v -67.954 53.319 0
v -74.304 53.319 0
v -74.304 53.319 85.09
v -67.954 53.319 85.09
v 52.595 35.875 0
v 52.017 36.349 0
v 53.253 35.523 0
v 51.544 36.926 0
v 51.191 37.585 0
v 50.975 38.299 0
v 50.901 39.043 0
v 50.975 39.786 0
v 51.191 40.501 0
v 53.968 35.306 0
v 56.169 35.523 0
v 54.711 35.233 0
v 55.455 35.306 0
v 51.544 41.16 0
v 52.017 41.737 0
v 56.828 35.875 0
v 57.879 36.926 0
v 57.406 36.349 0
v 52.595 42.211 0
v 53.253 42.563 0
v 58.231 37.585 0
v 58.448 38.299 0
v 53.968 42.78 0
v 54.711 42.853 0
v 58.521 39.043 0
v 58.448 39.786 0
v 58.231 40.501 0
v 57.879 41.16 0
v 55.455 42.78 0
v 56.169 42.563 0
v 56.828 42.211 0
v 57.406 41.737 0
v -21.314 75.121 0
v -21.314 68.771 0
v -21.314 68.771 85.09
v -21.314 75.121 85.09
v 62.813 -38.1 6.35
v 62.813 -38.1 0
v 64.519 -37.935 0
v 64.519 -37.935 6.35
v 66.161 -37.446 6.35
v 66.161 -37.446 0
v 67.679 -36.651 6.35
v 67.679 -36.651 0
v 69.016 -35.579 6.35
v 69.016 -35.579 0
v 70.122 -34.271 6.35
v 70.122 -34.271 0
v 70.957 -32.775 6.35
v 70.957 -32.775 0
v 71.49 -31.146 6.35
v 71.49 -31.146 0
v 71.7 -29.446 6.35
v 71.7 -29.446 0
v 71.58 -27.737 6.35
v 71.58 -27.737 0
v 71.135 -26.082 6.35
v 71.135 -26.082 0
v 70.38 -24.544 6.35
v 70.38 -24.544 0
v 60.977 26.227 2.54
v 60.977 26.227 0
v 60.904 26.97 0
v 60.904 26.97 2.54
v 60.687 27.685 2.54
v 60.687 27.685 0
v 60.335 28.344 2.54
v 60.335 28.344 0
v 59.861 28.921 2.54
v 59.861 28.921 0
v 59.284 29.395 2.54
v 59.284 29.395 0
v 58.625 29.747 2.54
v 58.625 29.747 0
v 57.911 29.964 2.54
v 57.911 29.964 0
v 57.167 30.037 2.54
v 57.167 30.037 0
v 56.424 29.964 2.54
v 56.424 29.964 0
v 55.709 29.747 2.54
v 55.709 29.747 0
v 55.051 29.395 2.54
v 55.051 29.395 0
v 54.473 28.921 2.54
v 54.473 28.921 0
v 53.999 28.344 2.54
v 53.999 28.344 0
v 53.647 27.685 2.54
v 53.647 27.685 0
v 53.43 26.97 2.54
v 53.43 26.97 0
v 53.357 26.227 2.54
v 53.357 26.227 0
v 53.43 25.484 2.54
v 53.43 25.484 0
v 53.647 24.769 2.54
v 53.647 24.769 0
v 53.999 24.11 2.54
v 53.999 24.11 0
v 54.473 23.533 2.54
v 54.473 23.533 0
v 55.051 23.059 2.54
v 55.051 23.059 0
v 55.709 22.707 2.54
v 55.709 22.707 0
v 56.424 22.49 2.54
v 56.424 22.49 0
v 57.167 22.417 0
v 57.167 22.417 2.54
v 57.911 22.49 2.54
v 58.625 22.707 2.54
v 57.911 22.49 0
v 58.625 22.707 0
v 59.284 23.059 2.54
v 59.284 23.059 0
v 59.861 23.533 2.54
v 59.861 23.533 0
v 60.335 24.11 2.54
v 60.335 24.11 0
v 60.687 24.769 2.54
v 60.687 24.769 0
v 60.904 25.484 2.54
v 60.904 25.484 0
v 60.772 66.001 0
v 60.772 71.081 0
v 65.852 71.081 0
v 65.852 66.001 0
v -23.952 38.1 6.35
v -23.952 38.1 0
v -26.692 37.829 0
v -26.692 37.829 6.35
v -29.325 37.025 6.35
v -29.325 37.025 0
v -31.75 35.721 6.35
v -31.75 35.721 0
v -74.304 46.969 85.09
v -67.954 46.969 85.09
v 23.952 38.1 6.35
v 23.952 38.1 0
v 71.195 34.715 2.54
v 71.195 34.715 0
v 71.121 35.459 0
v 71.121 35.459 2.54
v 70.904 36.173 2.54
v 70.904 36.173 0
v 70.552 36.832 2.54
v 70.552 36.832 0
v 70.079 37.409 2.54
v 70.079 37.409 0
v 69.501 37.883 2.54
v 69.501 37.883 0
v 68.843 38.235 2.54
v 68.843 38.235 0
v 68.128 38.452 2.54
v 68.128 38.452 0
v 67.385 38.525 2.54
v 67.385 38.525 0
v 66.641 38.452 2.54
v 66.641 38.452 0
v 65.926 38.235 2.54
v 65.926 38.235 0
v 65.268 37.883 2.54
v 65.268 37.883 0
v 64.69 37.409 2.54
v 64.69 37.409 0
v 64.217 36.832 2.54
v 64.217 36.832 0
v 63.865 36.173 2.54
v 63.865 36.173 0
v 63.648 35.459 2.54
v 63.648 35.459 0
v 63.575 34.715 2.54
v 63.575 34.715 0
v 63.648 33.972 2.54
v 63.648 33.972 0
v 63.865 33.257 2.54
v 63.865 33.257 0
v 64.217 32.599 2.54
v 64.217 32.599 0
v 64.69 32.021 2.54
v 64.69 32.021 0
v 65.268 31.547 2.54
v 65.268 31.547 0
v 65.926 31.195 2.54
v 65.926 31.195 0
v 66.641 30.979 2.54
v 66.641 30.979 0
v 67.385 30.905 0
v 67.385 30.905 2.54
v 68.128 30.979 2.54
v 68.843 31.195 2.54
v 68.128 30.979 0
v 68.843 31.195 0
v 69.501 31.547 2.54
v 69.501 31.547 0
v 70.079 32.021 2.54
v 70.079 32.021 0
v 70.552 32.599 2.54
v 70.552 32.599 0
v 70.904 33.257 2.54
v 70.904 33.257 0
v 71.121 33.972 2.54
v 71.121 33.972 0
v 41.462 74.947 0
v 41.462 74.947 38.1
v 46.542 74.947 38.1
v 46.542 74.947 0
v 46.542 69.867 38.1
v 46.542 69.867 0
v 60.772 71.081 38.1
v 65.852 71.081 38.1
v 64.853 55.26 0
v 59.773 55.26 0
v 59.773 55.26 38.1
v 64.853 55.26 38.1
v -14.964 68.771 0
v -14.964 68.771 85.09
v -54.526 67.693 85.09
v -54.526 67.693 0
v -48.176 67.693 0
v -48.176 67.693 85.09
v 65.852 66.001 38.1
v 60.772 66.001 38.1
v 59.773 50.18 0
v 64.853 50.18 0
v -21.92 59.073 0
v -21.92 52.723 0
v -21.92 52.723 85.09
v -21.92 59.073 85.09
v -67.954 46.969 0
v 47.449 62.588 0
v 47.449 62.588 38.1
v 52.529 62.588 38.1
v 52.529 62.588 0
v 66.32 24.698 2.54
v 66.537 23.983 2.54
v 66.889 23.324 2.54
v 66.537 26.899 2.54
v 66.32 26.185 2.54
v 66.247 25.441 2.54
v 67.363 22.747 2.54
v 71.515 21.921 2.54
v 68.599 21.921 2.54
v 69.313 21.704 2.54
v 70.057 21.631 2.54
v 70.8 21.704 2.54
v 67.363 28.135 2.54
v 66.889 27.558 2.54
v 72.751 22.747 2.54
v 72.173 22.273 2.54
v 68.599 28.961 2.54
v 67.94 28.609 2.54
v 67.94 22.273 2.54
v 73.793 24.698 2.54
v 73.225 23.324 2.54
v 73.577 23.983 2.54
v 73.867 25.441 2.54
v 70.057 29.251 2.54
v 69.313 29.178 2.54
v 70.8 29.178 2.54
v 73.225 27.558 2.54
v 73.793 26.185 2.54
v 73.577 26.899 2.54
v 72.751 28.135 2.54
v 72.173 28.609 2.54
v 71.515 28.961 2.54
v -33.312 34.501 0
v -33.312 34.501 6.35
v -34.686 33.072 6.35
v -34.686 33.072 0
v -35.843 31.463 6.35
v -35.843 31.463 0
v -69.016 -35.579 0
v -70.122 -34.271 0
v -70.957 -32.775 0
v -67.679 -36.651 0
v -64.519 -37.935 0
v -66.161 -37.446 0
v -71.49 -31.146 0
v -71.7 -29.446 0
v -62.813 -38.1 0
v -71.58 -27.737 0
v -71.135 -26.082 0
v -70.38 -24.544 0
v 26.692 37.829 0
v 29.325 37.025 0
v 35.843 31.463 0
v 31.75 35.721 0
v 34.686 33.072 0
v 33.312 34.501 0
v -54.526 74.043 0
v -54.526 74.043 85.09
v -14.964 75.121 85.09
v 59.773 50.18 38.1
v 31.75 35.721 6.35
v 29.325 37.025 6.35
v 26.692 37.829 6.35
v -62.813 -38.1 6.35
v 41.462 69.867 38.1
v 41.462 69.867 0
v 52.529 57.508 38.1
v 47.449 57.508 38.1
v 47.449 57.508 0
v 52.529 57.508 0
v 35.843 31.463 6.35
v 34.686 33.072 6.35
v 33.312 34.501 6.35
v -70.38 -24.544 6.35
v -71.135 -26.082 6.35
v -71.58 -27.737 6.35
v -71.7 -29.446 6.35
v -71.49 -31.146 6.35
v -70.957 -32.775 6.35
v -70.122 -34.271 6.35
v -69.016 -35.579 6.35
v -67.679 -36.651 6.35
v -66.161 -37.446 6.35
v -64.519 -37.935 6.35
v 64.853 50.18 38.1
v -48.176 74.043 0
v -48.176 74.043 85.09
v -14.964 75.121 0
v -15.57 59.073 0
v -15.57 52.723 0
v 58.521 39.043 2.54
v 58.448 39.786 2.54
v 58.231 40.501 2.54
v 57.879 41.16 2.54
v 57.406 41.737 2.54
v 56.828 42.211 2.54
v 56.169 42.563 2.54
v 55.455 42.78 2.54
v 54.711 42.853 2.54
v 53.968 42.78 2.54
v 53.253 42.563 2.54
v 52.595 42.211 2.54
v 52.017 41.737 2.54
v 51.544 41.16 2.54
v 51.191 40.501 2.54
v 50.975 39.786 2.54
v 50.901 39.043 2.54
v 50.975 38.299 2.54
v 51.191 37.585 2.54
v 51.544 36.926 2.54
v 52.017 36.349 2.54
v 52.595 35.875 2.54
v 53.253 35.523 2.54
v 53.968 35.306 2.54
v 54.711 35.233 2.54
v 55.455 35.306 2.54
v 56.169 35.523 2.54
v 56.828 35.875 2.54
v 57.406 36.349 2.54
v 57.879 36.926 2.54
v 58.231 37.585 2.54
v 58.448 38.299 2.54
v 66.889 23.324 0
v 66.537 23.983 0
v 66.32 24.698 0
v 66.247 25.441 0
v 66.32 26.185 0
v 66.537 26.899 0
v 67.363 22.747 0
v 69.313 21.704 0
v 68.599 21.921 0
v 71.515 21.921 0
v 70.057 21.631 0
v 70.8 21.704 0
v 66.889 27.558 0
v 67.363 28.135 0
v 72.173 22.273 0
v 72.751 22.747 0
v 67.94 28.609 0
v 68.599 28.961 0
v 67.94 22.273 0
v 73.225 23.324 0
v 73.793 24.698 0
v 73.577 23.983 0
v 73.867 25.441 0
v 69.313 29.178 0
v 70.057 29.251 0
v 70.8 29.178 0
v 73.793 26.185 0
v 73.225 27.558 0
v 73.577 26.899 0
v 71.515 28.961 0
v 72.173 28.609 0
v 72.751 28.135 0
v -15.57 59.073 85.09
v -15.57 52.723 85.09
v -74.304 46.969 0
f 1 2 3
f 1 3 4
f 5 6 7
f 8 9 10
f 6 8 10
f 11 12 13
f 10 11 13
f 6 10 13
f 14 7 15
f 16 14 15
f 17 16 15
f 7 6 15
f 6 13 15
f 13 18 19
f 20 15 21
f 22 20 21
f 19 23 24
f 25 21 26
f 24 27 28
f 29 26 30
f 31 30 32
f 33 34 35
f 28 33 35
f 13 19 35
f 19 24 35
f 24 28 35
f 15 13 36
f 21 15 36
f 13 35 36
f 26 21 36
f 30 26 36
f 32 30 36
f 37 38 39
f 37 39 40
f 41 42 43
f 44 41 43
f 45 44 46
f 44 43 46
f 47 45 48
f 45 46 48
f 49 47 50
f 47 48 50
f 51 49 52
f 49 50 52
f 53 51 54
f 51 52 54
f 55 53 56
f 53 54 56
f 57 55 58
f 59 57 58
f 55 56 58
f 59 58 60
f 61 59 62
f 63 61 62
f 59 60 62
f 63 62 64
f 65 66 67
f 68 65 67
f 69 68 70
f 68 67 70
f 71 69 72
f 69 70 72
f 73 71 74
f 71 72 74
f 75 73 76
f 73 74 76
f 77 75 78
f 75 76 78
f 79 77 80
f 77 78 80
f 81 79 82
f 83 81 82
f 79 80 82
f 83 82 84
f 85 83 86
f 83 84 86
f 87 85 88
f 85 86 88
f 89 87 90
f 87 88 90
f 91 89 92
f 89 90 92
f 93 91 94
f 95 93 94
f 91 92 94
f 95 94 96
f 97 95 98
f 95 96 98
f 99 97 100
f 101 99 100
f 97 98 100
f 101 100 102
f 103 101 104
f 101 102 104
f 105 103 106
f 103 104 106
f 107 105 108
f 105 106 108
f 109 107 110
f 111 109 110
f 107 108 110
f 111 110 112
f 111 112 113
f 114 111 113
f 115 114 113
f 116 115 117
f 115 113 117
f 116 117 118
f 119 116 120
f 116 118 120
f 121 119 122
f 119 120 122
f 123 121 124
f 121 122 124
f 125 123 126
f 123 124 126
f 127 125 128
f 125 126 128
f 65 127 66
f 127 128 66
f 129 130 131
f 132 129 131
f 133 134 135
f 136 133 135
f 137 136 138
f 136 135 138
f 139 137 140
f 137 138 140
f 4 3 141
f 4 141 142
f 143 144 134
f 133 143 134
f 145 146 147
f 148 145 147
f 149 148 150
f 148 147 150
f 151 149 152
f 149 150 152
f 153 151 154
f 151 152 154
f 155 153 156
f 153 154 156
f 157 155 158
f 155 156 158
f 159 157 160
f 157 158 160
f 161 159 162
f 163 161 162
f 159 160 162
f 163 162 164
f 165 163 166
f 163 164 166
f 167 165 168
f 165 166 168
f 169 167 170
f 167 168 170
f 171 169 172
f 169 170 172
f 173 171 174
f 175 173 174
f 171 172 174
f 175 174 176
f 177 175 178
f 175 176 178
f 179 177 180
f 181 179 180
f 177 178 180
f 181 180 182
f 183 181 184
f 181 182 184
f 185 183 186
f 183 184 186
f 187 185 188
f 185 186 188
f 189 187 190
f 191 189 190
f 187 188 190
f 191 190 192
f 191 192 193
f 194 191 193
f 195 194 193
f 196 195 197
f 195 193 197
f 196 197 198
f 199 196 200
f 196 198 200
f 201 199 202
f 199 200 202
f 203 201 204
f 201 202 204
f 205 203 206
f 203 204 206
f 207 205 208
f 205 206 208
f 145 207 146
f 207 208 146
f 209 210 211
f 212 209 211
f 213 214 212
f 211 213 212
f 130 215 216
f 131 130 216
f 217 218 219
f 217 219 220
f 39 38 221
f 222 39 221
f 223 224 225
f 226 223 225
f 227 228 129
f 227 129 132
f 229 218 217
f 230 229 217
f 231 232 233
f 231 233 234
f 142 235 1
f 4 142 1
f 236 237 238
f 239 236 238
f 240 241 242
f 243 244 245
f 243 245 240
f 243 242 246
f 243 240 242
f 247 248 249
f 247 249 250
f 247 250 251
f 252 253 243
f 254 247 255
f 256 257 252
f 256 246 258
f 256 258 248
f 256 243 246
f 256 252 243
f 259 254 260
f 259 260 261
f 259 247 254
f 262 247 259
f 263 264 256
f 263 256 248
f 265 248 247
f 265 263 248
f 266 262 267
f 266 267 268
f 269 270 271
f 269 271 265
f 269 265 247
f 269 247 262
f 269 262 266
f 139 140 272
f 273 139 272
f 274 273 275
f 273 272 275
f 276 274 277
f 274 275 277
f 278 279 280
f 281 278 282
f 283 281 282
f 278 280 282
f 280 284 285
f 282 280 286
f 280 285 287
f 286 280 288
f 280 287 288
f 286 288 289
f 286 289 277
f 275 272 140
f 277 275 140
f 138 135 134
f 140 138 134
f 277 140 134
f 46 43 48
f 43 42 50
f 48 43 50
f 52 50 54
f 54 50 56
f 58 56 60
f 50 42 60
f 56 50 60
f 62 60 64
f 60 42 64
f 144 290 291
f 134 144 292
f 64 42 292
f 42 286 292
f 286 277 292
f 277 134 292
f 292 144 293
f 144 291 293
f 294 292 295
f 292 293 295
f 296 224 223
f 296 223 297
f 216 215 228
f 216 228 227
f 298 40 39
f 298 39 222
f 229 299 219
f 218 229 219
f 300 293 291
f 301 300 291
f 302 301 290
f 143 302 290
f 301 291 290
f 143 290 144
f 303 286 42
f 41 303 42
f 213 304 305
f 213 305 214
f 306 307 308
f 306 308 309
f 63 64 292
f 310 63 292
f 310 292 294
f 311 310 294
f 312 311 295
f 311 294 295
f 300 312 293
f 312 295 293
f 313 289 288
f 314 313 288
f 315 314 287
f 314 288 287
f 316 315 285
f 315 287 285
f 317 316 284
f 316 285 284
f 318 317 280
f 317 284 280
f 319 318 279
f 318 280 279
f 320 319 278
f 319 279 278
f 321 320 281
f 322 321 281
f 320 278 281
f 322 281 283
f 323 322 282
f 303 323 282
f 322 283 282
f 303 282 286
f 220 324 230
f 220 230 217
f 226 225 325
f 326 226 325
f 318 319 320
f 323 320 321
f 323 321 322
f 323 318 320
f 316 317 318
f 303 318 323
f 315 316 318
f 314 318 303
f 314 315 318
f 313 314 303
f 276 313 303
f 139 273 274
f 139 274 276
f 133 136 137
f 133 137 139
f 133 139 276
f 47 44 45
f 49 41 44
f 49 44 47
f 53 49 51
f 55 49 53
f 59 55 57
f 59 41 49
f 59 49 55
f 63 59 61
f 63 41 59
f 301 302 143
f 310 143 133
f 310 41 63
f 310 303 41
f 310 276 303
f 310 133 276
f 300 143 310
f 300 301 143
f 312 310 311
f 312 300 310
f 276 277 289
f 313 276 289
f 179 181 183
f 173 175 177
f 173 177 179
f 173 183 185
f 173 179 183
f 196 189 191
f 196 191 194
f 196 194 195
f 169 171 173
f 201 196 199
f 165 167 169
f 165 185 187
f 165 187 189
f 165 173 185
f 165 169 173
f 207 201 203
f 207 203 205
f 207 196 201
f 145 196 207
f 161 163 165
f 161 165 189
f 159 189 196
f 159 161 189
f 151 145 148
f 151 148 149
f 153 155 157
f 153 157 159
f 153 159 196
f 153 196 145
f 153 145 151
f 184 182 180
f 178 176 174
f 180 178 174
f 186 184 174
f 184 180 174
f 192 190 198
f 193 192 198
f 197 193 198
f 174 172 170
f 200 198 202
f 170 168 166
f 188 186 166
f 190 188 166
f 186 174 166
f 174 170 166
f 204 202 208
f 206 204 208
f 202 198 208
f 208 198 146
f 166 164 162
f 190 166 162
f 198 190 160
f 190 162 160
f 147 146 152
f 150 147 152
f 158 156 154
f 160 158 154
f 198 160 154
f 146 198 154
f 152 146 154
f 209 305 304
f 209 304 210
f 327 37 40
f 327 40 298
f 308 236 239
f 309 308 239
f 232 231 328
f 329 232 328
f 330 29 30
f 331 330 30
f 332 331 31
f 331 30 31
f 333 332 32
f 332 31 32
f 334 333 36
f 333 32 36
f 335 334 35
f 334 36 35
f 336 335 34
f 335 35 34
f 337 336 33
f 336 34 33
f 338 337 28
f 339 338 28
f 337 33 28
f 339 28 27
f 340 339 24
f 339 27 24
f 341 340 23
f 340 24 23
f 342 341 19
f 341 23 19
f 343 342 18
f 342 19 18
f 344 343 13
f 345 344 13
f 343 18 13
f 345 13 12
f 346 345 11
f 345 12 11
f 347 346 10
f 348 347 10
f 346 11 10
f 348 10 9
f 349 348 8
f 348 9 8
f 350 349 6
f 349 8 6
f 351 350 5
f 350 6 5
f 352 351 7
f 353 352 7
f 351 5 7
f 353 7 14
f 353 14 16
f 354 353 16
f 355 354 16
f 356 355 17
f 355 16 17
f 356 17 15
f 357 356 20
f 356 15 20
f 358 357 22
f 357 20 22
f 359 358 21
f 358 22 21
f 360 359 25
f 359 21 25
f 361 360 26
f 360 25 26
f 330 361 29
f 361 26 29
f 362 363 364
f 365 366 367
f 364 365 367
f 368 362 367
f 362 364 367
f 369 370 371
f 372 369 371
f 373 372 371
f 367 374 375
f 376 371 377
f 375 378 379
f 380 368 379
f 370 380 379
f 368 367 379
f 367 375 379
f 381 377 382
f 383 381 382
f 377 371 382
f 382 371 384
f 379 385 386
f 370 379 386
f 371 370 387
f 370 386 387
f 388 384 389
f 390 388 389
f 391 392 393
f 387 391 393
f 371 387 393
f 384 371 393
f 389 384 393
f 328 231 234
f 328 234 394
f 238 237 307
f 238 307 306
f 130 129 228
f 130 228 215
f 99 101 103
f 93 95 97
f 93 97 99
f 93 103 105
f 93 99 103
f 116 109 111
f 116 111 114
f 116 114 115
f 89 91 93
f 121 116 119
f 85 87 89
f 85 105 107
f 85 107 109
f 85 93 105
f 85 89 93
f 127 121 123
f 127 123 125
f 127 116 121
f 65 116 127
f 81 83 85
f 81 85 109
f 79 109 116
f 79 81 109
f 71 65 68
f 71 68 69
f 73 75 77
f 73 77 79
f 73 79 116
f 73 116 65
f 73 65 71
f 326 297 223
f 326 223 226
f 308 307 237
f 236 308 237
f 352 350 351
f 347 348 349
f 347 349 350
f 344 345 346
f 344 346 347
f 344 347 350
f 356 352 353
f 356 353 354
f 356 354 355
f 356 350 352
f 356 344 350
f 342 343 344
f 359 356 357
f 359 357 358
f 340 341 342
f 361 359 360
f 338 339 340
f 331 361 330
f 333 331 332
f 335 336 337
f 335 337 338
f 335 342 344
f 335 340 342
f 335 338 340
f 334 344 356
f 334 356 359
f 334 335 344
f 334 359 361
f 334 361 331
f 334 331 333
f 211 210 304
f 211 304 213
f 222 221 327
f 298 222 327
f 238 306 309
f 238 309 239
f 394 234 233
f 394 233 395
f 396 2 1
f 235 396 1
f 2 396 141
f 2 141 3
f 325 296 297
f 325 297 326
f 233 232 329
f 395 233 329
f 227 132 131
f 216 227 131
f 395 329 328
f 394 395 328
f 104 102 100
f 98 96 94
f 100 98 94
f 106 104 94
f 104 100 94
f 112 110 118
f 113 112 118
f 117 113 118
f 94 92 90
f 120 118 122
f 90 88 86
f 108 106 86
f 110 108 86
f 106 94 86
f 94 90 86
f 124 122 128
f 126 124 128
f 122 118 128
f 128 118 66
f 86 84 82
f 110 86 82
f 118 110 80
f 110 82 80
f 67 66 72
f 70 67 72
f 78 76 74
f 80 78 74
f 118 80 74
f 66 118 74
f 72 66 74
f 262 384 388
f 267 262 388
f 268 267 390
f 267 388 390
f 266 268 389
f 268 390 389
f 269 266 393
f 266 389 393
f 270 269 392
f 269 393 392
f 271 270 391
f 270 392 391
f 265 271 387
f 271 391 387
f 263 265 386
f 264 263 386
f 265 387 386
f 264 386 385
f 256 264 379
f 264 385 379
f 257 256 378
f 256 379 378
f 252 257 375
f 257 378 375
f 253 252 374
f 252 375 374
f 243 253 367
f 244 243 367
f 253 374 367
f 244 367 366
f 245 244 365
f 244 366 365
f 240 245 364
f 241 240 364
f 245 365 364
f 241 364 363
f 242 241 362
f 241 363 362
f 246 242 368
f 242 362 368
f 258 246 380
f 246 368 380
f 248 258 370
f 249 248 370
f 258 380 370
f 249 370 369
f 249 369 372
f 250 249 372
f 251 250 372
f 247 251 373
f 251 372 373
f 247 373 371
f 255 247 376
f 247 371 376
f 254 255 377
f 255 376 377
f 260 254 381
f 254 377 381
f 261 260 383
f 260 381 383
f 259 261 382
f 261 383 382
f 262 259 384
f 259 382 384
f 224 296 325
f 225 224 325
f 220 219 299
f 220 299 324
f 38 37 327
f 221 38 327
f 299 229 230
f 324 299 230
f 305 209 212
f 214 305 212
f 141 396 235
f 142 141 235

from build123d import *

# Parameters (mm, degrees)
F1_DEPTH = 6.35
F2_W     = 6.35
F2_H     = 6.35
F3_DEPTH = 85.09
F4_W     = 5.08
F4_H     = 5.08
F5_DEPTH = 38.1
F6_R     = 3.81
F7_DEPTH = 2.54


with BuildPart() as f1:
    # F0 (on Top) → F1 (new body)
    with BuildSketch(Plane.XY):
        with BuildLine():
            Line((23.952148, 38.1), (-23.952148, 38.1))
            ThreePointArc((-23.952148, 38.1), (-28.028467, 37.492055), (-31.75, 35.721134))
            Line((-31.75, 35.721134), (-31.75, -38.1))
            Line((-31.75, -38.1), (31.75, -38.1))
            Line((31.75, -38.1), (31.75, 35.721134))
            ThreePointArc((31.75, 35.721134), (28.028467, 37.492055), (23.952148, 38.1))
        make_face()
        with BuildLine():
            Line((-31.75, -38.1), (-31.75, 35.721134))
            ThreePointArc((-31.75, 35.721134), (-34.024133, 33.810703), (-35.843005, 31.462695))
            Line((-35.843005, 31.462695), (-70.380306, -24.543739))
            ThreePointArc((-70.380306, -24.543739), (-70.575972, -33.542958), (-62.813397, -38.1))
            Line((-62.813397, -38.1), (-31.75, -38.1))
        make_face()
        with BuildLine():
            ThreePointArc((35.843005, 31.462695), (34.024133, 33.810703), (31.75, 35.721134))
            Line((31.75, 35.721134), (31.75, -38.1))
            Line((31.75, -38.1), (62.813397, -38.1))
            ThreePointArc((62.813397, -38.1), (70.575972, -33.542958), (70.380306, -24.543739))
            Line((70.380306, -24.543739), (35.843005, 31.462695))
        make_face()
    extrude(amount=F1_DEPTH)


with BuildPart() as f3:
    # F2 (on Top) → F3 (new body)
    with BuildSketch(Plane.XY):
        with Locations((-51.351212, 70.868217)):
            Rectangle(F2_W, F2_H)
        with Locations((-18.139292, 71.945995)):
            Rectangle(F2_W, F2_H)
        with Locations((-18.744886, 55.897664)):
            Rectangle(F2_W, F2_H)
        with Locations((-71.129054, 50.14449)):
            Rectangle(F2_W, F2_H)
    extrude(amount=F3_DEPTH)


with BuildPart() as f5:
    # F4 (on Top) → F5 (new body)
    with BuildSketch(Plane.XY):
        with Locations((44.001669, 72.406939)):
            Rectangle(F4_W, F4_H)
        with Locations((63.311726, 68.540879)):
            Rectangle(F4_W, F4_H)
        with Locations((49.988925, 60.047593)):
            Rectangle(F4_W, F4_H)
        with Locations((62.31251, 52.720055)):
            Rectangle(F4_W, F4_H)
    extrude(amount=F5_DEPTH)


with BuildPart() as f7:
    # F6 (on Top) → F7 (new body)
    with BuildSketch(Plane.XY):
        with Locations((54.711472, 39.042778)):
            Circle(F6_R)
        with Locations((67.384511, 34.715317)):
            Circle(F6_R)
        with Locations((57.167284, 26.227161)):
            Circle(F6_R)
        with Locations((70.056707, 25.441222)):
            Circle(F6_R)
    extrude(amount=F7_DEPTH)


solid = Compound([f1.part, f3.part, f5.part, f7.part])
